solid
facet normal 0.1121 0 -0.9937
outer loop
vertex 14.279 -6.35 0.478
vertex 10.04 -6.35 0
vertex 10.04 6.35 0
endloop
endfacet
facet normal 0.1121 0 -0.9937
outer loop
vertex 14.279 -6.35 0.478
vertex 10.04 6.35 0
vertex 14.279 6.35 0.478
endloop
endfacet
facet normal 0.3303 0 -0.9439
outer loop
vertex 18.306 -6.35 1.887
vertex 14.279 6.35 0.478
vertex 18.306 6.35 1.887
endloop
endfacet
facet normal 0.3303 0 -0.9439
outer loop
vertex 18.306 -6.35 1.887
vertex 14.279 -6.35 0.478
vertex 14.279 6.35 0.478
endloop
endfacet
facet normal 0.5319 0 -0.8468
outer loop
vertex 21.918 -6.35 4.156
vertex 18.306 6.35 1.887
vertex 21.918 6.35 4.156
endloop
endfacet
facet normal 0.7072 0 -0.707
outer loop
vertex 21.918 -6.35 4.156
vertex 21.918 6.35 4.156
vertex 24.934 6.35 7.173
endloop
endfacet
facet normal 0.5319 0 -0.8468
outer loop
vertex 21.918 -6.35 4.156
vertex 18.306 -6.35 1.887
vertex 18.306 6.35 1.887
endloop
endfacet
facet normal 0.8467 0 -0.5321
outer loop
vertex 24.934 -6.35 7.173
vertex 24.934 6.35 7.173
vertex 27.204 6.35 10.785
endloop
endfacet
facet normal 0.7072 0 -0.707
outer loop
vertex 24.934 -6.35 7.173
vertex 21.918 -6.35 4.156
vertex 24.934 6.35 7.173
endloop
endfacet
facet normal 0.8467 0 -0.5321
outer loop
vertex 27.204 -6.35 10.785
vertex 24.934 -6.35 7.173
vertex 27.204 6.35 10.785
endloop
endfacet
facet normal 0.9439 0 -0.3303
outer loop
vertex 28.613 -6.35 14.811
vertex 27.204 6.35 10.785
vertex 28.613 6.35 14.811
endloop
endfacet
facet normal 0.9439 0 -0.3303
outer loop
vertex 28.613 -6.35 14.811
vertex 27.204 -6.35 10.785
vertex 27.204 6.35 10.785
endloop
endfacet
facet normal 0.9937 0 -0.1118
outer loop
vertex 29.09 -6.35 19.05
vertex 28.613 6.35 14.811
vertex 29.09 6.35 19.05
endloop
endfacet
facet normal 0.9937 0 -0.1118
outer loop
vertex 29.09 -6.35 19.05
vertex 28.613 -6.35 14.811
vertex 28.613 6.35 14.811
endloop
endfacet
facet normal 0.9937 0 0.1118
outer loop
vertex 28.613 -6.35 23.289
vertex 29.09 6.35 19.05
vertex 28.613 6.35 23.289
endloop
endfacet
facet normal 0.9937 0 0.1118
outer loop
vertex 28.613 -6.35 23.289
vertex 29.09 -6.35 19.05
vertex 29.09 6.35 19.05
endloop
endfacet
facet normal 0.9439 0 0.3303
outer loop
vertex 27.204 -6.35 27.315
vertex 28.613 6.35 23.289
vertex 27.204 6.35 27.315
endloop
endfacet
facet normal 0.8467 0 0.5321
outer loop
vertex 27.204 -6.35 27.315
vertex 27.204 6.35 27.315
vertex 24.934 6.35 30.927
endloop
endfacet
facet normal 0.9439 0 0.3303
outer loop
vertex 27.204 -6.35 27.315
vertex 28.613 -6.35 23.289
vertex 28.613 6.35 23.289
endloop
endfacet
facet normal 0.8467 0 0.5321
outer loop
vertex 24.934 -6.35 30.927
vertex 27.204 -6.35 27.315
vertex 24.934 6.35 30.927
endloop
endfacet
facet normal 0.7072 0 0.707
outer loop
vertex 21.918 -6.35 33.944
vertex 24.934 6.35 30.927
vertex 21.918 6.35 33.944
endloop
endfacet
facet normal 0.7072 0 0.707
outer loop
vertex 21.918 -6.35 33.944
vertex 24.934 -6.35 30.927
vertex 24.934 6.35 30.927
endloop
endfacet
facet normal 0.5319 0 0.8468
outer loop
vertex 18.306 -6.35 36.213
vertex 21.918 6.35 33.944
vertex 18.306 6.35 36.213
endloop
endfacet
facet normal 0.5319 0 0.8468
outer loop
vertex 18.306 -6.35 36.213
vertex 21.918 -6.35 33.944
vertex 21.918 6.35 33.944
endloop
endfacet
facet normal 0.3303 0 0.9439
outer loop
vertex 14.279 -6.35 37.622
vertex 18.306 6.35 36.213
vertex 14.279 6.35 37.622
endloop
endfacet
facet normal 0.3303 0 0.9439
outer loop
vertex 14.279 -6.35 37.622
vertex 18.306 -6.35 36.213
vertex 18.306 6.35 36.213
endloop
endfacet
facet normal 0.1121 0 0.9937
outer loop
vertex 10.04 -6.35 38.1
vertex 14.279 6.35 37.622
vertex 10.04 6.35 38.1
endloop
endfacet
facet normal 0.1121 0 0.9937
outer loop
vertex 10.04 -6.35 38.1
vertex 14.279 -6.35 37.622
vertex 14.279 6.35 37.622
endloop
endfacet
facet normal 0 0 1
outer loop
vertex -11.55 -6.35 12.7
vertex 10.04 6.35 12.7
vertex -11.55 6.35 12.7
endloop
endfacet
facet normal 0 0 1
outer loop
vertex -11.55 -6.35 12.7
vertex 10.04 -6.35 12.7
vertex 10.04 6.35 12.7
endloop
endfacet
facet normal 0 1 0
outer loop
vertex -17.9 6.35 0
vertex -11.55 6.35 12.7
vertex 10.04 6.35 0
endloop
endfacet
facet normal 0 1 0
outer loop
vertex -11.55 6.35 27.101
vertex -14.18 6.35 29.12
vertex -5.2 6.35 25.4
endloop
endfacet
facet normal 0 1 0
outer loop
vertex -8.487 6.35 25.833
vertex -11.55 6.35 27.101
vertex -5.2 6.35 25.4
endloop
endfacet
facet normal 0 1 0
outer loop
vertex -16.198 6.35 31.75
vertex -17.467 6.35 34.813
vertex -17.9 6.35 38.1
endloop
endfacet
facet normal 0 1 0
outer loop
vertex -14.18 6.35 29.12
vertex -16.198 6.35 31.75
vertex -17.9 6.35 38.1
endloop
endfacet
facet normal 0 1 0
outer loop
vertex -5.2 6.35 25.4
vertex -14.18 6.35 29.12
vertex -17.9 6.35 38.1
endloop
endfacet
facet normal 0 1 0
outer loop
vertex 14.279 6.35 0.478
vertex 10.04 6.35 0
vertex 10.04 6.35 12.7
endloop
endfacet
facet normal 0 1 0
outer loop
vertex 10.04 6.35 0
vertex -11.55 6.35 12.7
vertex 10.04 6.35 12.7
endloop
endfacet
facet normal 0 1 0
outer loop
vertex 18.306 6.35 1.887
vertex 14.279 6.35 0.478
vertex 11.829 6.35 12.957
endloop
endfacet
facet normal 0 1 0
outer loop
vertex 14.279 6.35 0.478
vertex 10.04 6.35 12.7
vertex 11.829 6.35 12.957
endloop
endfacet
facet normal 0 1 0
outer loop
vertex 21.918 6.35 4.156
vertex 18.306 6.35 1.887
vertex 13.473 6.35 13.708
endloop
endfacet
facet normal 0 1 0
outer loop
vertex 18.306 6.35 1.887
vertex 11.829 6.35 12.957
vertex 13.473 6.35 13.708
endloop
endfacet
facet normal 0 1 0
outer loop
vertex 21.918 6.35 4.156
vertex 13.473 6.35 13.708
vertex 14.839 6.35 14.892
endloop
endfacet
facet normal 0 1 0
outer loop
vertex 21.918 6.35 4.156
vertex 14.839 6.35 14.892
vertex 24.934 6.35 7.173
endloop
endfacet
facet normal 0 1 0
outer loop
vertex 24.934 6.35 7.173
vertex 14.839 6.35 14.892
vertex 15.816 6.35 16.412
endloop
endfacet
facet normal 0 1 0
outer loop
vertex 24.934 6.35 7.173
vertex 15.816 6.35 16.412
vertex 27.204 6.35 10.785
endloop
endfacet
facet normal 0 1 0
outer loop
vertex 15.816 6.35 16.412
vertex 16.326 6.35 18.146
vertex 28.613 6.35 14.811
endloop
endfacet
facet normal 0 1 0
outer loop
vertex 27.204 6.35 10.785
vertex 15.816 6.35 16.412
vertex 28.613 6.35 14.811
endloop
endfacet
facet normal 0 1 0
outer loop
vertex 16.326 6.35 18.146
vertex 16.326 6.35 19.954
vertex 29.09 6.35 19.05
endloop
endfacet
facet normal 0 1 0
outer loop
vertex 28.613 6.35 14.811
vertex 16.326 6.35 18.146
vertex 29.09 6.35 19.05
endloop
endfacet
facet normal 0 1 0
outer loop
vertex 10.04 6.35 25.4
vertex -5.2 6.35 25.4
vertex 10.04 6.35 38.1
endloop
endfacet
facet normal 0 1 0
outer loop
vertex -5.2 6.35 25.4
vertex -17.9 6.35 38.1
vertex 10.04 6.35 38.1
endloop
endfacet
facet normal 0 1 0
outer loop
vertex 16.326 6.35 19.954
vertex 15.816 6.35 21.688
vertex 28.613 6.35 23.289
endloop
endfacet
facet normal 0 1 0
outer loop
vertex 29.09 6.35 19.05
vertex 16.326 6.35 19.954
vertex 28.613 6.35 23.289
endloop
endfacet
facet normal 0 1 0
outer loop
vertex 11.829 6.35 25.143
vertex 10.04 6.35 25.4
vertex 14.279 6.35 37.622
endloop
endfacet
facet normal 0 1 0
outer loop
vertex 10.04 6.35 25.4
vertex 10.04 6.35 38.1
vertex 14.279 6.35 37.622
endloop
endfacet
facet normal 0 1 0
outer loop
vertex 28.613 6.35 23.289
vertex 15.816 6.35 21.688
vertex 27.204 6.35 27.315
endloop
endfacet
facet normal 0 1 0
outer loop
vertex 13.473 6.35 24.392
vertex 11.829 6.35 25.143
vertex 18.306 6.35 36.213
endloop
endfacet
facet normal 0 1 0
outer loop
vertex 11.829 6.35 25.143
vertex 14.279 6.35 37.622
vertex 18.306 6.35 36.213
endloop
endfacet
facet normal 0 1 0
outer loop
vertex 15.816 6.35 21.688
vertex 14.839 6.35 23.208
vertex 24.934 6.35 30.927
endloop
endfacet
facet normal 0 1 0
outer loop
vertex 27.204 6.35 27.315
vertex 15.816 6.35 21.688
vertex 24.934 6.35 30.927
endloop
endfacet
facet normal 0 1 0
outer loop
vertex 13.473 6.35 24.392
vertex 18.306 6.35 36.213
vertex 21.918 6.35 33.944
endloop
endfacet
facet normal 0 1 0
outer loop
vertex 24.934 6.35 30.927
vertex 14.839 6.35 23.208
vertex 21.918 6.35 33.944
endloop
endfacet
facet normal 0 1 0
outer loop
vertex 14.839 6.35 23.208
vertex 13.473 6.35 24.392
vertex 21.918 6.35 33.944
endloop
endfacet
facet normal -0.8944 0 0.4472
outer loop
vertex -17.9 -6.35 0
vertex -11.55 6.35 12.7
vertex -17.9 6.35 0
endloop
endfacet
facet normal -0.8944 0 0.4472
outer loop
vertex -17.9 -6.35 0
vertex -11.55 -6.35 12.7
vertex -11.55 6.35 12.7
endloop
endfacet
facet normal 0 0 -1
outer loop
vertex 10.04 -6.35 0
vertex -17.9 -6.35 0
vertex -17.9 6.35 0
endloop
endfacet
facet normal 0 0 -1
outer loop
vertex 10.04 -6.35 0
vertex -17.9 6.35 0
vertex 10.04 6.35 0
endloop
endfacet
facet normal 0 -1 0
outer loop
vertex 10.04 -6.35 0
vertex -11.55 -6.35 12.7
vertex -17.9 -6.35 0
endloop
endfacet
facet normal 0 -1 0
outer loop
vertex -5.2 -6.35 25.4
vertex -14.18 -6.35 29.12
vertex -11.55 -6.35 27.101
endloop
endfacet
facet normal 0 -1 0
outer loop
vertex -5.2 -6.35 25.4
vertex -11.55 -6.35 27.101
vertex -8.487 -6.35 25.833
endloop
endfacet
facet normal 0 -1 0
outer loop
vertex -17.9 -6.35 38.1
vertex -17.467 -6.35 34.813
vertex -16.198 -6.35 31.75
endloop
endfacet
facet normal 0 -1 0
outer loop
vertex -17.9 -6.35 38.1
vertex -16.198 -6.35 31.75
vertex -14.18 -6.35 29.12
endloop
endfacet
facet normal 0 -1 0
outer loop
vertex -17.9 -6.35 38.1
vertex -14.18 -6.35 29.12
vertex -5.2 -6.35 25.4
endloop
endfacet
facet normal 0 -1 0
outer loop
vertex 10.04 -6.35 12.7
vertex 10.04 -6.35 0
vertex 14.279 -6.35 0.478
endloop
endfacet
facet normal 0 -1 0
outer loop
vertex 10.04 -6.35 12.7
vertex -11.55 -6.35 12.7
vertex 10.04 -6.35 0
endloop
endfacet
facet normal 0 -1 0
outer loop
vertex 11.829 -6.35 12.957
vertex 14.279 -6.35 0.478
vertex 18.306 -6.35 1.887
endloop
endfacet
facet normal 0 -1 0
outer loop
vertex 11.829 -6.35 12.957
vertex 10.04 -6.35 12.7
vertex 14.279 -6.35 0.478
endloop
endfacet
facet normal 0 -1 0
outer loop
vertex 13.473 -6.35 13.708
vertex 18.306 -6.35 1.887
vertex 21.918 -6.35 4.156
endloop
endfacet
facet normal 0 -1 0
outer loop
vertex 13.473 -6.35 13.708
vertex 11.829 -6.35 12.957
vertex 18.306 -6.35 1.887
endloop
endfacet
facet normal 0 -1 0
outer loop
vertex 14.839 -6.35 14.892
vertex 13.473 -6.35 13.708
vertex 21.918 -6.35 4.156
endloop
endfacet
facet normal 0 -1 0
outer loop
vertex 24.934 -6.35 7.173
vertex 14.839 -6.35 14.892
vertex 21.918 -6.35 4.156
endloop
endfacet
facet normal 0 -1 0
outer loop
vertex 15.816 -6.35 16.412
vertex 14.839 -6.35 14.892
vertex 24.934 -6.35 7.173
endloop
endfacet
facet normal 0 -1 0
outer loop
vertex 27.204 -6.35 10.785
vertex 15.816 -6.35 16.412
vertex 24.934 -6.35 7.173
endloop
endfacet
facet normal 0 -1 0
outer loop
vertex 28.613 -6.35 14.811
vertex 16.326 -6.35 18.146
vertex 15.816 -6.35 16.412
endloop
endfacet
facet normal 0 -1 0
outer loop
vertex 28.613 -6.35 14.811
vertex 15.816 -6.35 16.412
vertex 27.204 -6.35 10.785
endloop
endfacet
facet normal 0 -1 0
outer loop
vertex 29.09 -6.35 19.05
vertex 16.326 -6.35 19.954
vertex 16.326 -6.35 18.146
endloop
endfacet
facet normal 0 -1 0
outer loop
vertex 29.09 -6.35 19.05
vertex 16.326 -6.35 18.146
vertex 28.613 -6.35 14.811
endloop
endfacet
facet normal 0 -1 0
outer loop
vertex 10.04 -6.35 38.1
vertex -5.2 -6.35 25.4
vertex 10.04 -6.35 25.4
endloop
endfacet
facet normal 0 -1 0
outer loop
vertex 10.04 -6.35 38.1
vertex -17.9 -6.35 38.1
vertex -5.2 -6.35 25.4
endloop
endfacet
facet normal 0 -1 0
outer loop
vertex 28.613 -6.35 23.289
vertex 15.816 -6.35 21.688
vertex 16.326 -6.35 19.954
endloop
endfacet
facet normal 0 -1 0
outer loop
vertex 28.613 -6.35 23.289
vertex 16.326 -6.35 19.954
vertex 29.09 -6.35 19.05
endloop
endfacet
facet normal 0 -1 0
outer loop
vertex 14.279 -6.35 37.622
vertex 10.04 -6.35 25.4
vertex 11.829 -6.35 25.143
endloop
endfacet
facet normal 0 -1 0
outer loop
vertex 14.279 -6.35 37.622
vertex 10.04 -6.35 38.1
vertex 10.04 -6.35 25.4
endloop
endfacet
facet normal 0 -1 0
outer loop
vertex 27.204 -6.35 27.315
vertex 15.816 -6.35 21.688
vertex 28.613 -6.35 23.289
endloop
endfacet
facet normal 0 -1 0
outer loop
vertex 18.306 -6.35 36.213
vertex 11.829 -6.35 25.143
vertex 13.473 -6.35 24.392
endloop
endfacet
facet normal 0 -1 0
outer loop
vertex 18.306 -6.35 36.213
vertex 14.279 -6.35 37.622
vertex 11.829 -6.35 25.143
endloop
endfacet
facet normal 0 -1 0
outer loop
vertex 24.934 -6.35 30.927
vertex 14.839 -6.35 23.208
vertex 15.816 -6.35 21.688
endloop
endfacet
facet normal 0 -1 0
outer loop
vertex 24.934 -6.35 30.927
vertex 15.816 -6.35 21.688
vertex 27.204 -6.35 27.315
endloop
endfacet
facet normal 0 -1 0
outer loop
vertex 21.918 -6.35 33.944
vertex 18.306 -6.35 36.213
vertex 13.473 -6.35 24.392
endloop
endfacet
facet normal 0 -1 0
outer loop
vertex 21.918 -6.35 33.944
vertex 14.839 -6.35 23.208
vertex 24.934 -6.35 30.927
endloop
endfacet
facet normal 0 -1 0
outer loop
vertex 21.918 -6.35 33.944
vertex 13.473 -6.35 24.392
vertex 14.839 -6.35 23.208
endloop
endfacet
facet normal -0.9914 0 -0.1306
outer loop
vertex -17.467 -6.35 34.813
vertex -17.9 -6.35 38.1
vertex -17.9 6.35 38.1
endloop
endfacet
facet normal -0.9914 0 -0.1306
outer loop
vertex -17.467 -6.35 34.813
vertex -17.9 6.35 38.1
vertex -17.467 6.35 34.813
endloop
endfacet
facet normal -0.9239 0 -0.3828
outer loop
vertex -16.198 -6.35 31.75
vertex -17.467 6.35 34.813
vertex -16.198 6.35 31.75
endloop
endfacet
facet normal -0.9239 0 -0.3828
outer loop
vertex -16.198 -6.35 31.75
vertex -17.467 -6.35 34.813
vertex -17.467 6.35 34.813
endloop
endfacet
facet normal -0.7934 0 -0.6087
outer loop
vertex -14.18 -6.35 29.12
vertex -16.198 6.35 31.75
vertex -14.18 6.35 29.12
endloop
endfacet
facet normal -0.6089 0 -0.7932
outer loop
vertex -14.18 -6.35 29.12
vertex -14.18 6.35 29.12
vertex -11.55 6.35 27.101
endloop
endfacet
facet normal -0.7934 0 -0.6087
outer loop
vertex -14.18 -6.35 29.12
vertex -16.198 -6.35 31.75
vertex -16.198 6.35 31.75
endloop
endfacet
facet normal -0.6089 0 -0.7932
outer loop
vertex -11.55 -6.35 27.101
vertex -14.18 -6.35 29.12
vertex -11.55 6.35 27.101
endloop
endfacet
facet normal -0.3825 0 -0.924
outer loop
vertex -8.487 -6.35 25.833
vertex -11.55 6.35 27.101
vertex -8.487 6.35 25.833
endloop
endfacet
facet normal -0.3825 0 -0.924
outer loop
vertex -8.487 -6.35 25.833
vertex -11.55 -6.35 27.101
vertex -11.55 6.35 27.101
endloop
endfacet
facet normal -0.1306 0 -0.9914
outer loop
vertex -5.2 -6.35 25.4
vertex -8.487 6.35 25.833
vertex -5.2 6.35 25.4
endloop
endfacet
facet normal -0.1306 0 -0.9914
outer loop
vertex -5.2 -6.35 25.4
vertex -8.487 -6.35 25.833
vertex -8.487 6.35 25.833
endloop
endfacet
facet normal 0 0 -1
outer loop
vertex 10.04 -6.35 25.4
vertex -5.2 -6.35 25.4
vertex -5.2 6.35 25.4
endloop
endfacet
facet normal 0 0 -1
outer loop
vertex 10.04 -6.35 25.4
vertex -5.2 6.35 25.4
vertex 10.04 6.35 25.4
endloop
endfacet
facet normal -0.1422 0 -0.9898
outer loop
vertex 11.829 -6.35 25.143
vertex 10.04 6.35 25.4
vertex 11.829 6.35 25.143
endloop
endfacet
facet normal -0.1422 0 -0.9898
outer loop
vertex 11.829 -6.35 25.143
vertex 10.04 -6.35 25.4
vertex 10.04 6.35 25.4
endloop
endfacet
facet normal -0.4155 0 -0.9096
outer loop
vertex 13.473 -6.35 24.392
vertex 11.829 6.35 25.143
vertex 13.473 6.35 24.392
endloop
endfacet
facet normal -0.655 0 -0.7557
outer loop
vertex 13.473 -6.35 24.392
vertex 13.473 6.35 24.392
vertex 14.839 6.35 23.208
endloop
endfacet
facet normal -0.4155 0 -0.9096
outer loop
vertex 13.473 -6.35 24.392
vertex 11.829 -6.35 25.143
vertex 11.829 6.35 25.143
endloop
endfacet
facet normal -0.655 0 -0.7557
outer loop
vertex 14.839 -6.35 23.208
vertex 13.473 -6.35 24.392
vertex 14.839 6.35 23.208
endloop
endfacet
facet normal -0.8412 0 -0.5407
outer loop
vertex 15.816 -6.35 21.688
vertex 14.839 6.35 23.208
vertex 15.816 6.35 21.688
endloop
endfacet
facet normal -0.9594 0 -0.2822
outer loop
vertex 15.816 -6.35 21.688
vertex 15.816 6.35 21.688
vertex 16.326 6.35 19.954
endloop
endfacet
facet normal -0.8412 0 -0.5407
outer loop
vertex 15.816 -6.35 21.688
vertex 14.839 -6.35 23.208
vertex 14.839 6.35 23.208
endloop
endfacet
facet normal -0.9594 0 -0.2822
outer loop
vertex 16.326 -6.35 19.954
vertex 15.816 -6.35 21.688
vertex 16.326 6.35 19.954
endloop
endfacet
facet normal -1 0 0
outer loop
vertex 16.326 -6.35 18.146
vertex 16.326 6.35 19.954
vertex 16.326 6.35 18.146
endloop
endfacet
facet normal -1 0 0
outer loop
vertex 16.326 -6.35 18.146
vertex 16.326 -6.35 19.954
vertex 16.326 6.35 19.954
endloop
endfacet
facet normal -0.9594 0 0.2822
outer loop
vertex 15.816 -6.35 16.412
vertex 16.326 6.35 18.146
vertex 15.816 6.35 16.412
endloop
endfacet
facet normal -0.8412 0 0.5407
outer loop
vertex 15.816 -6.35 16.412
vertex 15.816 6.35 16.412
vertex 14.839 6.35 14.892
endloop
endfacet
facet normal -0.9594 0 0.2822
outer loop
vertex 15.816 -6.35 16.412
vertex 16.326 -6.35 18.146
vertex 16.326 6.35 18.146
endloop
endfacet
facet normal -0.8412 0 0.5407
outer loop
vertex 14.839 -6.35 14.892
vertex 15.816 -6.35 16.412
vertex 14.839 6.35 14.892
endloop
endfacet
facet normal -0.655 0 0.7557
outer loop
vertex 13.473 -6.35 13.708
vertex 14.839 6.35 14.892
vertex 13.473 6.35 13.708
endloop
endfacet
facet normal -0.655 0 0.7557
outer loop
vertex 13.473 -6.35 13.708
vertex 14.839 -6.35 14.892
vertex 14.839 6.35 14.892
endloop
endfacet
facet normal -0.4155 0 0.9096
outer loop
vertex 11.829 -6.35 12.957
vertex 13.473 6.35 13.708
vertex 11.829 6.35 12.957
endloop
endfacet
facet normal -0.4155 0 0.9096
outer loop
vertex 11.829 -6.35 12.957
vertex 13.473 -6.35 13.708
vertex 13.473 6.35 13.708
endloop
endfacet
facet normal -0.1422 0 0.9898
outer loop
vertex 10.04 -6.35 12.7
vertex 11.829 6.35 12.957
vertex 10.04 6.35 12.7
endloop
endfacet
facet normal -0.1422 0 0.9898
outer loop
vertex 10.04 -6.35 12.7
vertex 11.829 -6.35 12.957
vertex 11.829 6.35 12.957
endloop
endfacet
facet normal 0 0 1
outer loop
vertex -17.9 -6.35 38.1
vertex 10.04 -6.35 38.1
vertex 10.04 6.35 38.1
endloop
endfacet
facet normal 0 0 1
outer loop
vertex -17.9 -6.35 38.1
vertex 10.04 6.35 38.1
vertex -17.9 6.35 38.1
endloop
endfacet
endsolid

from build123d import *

# Parameters (mm, degrees)
F0_W     = 15.24
F0_H     = 12.7
F1_DEPTH = 6.35


# Not quite as in the source:
# - a feature names something its author has since deleted; it is built from what else it names


with BuildPart() as f1:
    # F0 (on Front) → F1 (new body, symmetric)
    with BuildSketch(Plane.XZ):
        Polygon((-11.5497628391, 12.7), (-17.8997628391, 0), (10.0402371609, 0), (10.0402371609, 12.7), align=None)
        with BuildLine():
            Line((10.0402371609, 12.7), (10.0402371609, 0))
            ThreePointArc((10.0402371609, 0), (29.0902371609, 19.05), (10.0402371609, 38.1))
            Line((10.0402371609, 38.1), (10.0402371609, 25.4))
            ThreePointArc((10.0402371609, 25.4), (16.3902371609, 19.05), (10.0402371609, 12.7))
        make_face()
        with Locations((2.4202371609, 31.75)):
            Rectangle(F0_W, F0_H)
        with BuildLine():
            Line((-5.1997628391, 25.4), (-5.1997628391, 38.1))
            Line((-5.1997628391, 38.1), (-17.8997628391, 38.1))
            ThreePointArc((-17.8997628391, 38.1), (-14.1800189601, 29.1197438789), (-5.1997628391, 25.4))
        make_face()
    extrude(amount=F1_DEPTH, both=True)


solid = f1.part
